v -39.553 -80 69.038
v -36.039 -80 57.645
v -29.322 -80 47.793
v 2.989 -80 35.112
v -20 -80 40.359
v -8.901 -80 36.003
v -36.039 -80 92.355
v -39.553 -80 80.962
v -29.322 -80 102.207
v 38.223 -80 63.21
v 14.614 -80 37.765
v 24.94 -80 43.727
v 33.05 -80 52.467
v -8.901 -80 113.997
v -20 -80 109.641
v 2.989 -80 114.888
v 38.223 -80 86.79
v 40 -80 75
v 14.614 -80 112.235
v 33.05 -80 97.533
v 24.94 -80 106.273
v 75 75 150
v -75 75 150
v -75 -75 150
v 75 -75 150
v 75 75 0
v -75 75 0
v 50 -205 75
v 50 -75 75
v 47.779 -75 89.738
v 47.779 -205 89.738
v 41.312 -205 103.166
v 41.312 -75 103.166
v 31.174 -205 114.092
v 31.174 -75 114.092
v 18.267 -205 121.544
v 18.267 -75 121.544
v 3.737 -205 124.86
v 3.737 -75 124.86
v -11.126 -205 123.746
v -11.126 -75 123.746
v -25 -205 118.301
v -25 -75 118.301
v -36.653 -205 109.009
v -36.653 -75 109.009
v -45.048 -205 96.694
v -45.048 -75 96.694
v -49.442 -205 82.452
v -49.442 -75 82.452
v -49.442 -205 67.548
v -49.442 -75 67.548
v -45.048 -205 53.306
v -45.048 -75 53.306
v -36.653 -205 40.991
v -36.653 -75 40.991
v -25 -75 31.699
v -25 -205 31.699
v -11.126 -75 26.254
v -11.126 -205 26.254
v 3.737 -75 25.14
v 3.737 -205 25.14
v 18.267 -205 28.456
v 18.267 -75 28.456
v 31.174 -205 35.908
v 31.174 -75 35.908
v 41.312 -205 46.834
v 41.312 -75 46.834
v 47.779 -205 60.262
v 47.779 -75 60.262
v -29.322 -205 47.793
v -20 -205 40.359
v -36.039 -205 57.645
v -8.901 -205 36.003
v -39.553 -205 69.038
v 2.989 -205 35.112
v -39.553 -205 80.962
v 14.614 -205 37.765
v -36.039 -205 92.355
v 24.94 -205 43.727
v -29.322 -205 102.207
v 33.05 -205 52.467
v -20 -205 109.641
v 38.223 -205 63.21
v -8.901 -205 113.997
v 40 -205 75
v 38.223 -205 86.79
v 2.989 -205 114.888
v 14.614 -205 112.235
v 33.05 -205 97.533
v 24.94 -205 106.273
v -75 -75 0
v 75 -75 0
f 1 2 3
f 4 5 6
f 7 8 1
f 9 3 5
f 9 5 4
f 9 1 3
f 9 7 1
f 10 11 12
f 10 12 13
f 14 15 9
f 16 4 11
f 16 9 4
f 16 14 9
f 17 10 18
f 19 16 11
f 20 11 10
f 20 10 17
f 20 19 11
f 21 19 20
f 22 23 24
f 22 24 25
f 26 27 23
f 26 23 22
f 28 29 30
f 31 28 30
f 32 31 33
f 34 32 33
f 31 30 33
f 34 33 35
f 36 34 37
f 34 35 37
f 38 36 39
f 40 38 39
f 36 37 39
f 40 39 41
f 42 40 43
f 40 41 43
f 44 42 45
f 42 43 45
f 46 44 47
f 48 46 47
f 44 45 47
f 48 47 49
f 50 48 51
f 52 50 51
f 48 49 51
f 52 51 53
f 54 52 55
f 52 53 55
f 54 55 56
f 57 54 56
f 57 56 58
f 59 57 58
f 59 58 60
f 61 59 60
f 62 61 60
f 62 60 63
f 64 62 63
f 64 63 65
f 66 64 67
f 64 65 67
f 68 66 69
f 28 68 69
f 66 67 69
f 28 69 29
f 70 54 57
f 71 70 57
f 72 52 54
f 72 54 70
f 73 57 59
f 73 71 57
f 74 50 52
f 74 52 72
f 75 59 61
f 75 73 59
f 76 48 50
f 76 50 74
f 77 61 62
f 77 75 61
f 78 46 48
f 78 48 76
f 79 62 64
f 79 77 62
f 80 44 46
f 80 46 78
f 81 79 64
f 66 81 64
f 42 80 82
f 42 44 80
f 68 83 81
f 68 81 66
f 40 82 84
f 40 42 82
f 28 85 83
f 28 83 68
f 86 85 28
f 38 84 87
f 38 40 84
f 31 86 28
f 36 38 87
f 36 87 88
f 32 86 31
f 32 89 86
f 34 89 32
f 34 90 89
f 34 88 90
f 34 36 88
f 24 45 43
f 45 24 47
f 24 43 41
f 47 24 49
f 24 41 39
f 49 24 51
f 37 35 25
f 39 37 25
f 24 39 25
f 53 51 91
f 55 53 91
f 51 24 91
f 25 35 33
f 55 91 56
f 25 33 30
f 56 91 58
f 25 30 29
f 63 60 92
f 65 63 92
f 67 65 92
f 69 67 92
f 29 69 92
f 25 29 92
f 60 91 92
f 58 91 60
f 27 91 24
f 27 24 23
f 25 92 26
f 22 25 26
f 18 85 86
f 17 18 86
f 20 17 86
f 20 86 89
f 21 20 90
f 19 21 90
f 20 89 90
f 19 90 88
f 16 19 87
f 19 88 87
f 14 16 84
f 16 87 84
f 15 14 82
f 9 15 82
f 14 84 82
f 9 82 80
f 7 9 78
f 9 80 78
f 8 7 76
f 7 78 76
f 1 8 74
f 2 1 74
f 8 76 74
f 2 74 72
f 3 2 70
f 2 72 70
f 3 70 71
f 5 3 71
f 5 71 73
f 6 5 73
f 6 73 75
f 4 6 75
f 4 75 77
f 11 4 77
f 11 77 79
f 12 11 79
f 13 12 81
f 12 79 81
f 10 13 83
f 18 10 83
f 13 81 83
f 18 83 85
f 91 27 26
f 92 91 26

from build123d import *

# Parameters (mm, degrees)
F0_W     = 150
F0_H     = 150
F1_DEPTH = 150
F3_R     = 50
F4_DEPTH = 130
F5_R     = 40
F6_DEPTH = 125


with BuildPart() as f1:
    # F0 (on Top) → F1 (new body)
    with BuildSketch(Plane.XY):
        Rectangle(F0_W, F0_H)
    extrude(amount=F1_DEPTH)

    # F3 (on face) → F4 (join)
    with BuildSketch(Plane.XZ.offset(75)):
        with Locations((0, 75)):
            Circle(F3_R)
    extrude(amount=F4_DEPTH)

    # F5 (on face) → F6 (cut)
    with BuildSketch(Plane.XZ.offset(205)):
        with Locations((0, 75)):
            Circle(F5_R)
    extrude(amount=-F6_DEPTH, mode=Mode.SUBTRACT)


solid = f1.part
